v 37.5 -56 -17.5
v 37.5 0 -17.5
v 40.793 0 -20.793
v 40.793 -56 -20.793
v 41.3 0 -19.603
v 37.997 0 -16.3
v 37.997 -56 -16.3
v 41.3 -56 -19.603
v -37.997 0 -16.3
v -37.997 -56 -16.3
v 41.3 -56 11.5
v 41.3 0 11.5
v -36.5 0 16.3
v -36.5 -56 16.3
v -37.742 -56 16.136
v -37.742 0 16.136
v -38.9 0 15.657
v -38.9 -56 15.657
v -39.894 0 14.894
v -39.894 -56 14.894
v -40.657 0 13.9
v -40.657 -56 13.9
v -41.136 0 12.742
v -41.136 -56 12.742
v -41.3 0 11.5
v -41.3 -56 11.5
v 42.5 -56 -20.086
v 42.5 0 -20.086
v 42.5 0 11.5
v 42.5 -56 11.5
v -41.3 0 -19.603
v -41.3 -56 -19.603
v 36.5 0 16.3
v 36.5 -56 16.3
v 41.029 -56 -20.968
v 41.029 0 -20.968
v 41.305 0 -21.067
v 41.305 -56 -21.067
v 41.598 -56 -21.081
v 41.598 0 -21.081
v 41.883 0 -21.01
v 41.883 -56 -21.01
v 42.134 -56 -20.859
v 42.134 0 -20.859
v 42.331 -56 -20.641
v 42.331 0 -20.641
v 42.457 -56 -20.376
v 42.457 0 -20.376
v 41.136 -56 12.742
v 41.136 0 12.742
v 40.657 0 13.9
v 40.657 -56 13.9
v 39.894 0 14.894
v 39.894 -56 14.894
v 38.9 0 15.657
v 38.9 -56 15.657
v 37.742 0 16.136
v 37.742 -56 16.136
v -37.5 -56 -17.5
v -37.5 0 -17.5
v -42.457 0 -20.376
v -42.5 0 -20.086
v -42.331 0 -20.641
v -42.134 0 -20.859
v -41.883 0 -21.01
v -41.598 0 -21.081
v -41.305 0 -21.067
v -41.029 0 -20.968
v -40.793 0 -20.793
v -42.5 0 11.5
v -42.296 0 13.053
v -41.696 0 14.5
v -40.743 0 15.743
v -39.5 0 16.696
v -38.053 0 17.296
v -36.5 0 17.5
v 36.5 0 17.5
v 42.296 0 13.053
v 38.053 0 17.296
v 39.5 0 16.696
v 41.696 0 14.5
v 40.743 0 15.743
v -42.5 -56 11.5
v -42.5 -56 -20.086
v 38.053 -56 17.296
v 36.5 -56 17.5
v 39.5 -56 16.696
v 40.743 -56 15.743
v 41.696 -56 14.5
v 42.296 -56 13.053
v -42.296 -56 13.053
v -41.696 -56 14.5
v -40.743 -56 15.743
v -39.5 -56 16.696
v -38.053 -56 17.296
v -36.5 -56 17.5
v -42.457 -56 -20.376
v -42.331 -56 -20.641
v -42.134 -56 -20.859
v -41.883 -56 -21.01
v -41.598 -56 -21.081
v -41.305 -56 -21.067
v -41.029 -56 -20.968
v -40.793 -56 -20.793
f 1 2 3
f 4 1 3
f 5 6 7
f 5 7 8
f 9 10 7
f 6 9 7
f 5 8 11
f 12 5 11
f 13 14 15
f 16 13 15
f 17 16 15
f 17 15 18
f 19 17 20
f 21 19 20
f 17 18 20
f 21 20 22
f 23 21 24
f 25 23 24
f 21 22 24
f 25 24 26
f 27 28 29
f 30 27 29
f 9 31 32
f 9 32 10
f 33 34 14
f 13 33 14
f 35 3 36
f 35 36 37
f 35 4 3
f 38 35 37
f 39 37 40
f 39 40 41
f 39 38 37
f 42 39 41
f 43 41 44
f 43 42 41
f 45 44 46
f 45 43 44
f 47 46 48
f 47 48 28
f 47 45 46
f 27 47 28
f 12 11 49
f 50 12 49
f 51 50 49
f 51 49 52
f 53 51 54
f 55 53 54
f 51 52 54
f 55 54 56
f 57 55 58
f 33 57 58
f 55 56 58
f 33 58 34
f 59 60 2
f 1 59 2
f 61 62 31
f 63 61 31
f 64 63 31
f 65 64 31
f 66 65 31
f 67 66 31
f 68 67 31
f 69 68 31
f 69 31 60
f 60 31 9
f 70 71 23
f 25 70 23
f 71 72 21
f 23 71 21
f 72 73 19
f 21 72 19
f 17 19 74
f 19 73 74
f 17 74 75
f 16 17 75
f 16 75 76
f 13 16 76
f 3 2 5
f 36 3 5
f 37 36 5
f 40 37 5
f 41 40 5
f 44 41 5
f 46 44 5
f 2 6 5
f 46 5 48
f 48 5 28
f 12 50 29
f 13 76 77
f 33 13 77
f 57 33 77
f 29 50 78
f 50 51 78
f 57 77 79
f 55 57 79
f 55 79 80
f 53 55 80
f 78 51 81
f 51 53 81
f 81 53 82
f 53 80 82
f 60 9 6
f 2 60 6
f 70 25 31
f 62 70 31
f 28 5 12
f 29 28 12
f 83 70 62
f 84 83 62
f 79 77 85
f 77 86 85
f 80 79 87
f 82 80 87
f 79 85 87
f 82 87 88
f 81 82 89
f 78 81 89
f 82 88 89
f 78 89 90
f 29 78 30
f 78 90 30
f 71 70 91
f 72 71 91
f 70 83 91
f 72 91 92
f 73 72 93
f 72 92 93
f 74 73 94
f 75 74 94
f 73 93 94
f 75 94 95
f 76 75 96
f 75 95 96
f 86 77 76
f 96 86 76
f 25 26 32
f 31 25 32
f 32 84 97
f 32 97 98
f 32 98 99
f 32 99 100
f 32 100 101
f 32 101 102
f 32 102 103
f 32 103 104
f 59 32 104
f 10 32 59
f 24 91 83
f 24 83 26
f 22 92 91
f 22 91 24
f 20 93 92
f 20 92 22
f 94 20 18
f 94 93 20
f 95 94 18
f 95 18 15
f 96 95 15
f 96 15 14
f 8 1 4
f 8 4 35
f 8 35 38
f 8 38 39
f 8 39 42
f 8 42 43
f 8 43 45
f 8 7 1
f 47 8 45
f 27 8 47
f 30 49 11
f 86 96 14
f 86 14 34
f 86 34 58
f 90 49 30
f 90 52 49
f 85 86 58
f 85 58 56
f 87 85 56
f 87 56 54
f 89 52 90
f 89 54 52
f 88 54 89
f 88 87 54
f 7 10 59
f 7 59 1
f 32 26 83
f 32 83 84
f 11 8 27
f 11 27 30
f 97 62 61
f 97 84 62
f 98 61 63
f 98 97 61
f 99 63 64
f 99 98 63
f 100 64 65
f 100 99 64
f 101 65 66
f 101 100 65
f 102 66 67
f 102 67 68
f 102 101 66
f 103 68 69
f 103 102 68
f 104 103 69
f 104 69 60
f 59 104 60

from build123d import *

# Parameters (mm, degrees)
F1_DEPTH = 56
F2_R     = 1
F3_R     = 6
F5_DEPTH = 99.1


with BuildPart() as f1:
    # F0 (on Front) → F1 (new body)
    with BuildSketch(Plane.XZ):
        Polygon((42.5, 17.5), (-42.5, 17.5), (-42.5, -17.5), (-37.5, -17.5), (37.5, -17.5), (42.5, -17.5), align=None)
        Polygon((-37.5, -17.5), (-42.5, -17.5), (-42.5, -22.5), align=None)
        Polygon((42.5, -22.5), (42.5, -17.5), (37.5, -17.5), align=None)
    extrude(amount=F1_DEPTH)

    # F2
    f2_edges = [f1.edges().sort_by_distance(p)[0] for p in [
        (-42.5, -28, -22.5),
        (42.5, -28, -22.5),
    ]]
    fillet(f2_edges, radius=F2_R)

    # F3
    f3_edges = [f1.edges().sort_by_distance(p)[0] for p in [
        (-42.5, -28, 17.5),
        (42.5, -28, 17.5),
    ]]
    fillet(f3_edges, radius=F3_R)

    # F4 (on face) → F5 (cut)
    with BuildSketch(Plane.XZ.offset(56)):
        with BuildLine():
            Line((-37.997056, -16.3), (37.997056, -16.3))
            Line((37.997056, -16.3), (41.3, -19.602944))
            Line((41.3, -19.602944), (41.3, 11.5))
            ThreePointArc((41.3, 11.5), (39.894113, 14.894113), (36.5, 16.3))
            Line((36.5, 16.3), (-36.5, 16.3))
            ThreePointArc((-36.5, 16.3), (-39.894113, 14.894113), (-41.3, 11.5))
            Line((-41.3, 11.5), (-41.3, -19.602944))
            Line((-41.3, -19.602944), (-37.997056, -16.3))
        make_face()
    extrude(amount=-F5_DEPTH, mode=Mode.SUBTRACT)


solid = f1.part
